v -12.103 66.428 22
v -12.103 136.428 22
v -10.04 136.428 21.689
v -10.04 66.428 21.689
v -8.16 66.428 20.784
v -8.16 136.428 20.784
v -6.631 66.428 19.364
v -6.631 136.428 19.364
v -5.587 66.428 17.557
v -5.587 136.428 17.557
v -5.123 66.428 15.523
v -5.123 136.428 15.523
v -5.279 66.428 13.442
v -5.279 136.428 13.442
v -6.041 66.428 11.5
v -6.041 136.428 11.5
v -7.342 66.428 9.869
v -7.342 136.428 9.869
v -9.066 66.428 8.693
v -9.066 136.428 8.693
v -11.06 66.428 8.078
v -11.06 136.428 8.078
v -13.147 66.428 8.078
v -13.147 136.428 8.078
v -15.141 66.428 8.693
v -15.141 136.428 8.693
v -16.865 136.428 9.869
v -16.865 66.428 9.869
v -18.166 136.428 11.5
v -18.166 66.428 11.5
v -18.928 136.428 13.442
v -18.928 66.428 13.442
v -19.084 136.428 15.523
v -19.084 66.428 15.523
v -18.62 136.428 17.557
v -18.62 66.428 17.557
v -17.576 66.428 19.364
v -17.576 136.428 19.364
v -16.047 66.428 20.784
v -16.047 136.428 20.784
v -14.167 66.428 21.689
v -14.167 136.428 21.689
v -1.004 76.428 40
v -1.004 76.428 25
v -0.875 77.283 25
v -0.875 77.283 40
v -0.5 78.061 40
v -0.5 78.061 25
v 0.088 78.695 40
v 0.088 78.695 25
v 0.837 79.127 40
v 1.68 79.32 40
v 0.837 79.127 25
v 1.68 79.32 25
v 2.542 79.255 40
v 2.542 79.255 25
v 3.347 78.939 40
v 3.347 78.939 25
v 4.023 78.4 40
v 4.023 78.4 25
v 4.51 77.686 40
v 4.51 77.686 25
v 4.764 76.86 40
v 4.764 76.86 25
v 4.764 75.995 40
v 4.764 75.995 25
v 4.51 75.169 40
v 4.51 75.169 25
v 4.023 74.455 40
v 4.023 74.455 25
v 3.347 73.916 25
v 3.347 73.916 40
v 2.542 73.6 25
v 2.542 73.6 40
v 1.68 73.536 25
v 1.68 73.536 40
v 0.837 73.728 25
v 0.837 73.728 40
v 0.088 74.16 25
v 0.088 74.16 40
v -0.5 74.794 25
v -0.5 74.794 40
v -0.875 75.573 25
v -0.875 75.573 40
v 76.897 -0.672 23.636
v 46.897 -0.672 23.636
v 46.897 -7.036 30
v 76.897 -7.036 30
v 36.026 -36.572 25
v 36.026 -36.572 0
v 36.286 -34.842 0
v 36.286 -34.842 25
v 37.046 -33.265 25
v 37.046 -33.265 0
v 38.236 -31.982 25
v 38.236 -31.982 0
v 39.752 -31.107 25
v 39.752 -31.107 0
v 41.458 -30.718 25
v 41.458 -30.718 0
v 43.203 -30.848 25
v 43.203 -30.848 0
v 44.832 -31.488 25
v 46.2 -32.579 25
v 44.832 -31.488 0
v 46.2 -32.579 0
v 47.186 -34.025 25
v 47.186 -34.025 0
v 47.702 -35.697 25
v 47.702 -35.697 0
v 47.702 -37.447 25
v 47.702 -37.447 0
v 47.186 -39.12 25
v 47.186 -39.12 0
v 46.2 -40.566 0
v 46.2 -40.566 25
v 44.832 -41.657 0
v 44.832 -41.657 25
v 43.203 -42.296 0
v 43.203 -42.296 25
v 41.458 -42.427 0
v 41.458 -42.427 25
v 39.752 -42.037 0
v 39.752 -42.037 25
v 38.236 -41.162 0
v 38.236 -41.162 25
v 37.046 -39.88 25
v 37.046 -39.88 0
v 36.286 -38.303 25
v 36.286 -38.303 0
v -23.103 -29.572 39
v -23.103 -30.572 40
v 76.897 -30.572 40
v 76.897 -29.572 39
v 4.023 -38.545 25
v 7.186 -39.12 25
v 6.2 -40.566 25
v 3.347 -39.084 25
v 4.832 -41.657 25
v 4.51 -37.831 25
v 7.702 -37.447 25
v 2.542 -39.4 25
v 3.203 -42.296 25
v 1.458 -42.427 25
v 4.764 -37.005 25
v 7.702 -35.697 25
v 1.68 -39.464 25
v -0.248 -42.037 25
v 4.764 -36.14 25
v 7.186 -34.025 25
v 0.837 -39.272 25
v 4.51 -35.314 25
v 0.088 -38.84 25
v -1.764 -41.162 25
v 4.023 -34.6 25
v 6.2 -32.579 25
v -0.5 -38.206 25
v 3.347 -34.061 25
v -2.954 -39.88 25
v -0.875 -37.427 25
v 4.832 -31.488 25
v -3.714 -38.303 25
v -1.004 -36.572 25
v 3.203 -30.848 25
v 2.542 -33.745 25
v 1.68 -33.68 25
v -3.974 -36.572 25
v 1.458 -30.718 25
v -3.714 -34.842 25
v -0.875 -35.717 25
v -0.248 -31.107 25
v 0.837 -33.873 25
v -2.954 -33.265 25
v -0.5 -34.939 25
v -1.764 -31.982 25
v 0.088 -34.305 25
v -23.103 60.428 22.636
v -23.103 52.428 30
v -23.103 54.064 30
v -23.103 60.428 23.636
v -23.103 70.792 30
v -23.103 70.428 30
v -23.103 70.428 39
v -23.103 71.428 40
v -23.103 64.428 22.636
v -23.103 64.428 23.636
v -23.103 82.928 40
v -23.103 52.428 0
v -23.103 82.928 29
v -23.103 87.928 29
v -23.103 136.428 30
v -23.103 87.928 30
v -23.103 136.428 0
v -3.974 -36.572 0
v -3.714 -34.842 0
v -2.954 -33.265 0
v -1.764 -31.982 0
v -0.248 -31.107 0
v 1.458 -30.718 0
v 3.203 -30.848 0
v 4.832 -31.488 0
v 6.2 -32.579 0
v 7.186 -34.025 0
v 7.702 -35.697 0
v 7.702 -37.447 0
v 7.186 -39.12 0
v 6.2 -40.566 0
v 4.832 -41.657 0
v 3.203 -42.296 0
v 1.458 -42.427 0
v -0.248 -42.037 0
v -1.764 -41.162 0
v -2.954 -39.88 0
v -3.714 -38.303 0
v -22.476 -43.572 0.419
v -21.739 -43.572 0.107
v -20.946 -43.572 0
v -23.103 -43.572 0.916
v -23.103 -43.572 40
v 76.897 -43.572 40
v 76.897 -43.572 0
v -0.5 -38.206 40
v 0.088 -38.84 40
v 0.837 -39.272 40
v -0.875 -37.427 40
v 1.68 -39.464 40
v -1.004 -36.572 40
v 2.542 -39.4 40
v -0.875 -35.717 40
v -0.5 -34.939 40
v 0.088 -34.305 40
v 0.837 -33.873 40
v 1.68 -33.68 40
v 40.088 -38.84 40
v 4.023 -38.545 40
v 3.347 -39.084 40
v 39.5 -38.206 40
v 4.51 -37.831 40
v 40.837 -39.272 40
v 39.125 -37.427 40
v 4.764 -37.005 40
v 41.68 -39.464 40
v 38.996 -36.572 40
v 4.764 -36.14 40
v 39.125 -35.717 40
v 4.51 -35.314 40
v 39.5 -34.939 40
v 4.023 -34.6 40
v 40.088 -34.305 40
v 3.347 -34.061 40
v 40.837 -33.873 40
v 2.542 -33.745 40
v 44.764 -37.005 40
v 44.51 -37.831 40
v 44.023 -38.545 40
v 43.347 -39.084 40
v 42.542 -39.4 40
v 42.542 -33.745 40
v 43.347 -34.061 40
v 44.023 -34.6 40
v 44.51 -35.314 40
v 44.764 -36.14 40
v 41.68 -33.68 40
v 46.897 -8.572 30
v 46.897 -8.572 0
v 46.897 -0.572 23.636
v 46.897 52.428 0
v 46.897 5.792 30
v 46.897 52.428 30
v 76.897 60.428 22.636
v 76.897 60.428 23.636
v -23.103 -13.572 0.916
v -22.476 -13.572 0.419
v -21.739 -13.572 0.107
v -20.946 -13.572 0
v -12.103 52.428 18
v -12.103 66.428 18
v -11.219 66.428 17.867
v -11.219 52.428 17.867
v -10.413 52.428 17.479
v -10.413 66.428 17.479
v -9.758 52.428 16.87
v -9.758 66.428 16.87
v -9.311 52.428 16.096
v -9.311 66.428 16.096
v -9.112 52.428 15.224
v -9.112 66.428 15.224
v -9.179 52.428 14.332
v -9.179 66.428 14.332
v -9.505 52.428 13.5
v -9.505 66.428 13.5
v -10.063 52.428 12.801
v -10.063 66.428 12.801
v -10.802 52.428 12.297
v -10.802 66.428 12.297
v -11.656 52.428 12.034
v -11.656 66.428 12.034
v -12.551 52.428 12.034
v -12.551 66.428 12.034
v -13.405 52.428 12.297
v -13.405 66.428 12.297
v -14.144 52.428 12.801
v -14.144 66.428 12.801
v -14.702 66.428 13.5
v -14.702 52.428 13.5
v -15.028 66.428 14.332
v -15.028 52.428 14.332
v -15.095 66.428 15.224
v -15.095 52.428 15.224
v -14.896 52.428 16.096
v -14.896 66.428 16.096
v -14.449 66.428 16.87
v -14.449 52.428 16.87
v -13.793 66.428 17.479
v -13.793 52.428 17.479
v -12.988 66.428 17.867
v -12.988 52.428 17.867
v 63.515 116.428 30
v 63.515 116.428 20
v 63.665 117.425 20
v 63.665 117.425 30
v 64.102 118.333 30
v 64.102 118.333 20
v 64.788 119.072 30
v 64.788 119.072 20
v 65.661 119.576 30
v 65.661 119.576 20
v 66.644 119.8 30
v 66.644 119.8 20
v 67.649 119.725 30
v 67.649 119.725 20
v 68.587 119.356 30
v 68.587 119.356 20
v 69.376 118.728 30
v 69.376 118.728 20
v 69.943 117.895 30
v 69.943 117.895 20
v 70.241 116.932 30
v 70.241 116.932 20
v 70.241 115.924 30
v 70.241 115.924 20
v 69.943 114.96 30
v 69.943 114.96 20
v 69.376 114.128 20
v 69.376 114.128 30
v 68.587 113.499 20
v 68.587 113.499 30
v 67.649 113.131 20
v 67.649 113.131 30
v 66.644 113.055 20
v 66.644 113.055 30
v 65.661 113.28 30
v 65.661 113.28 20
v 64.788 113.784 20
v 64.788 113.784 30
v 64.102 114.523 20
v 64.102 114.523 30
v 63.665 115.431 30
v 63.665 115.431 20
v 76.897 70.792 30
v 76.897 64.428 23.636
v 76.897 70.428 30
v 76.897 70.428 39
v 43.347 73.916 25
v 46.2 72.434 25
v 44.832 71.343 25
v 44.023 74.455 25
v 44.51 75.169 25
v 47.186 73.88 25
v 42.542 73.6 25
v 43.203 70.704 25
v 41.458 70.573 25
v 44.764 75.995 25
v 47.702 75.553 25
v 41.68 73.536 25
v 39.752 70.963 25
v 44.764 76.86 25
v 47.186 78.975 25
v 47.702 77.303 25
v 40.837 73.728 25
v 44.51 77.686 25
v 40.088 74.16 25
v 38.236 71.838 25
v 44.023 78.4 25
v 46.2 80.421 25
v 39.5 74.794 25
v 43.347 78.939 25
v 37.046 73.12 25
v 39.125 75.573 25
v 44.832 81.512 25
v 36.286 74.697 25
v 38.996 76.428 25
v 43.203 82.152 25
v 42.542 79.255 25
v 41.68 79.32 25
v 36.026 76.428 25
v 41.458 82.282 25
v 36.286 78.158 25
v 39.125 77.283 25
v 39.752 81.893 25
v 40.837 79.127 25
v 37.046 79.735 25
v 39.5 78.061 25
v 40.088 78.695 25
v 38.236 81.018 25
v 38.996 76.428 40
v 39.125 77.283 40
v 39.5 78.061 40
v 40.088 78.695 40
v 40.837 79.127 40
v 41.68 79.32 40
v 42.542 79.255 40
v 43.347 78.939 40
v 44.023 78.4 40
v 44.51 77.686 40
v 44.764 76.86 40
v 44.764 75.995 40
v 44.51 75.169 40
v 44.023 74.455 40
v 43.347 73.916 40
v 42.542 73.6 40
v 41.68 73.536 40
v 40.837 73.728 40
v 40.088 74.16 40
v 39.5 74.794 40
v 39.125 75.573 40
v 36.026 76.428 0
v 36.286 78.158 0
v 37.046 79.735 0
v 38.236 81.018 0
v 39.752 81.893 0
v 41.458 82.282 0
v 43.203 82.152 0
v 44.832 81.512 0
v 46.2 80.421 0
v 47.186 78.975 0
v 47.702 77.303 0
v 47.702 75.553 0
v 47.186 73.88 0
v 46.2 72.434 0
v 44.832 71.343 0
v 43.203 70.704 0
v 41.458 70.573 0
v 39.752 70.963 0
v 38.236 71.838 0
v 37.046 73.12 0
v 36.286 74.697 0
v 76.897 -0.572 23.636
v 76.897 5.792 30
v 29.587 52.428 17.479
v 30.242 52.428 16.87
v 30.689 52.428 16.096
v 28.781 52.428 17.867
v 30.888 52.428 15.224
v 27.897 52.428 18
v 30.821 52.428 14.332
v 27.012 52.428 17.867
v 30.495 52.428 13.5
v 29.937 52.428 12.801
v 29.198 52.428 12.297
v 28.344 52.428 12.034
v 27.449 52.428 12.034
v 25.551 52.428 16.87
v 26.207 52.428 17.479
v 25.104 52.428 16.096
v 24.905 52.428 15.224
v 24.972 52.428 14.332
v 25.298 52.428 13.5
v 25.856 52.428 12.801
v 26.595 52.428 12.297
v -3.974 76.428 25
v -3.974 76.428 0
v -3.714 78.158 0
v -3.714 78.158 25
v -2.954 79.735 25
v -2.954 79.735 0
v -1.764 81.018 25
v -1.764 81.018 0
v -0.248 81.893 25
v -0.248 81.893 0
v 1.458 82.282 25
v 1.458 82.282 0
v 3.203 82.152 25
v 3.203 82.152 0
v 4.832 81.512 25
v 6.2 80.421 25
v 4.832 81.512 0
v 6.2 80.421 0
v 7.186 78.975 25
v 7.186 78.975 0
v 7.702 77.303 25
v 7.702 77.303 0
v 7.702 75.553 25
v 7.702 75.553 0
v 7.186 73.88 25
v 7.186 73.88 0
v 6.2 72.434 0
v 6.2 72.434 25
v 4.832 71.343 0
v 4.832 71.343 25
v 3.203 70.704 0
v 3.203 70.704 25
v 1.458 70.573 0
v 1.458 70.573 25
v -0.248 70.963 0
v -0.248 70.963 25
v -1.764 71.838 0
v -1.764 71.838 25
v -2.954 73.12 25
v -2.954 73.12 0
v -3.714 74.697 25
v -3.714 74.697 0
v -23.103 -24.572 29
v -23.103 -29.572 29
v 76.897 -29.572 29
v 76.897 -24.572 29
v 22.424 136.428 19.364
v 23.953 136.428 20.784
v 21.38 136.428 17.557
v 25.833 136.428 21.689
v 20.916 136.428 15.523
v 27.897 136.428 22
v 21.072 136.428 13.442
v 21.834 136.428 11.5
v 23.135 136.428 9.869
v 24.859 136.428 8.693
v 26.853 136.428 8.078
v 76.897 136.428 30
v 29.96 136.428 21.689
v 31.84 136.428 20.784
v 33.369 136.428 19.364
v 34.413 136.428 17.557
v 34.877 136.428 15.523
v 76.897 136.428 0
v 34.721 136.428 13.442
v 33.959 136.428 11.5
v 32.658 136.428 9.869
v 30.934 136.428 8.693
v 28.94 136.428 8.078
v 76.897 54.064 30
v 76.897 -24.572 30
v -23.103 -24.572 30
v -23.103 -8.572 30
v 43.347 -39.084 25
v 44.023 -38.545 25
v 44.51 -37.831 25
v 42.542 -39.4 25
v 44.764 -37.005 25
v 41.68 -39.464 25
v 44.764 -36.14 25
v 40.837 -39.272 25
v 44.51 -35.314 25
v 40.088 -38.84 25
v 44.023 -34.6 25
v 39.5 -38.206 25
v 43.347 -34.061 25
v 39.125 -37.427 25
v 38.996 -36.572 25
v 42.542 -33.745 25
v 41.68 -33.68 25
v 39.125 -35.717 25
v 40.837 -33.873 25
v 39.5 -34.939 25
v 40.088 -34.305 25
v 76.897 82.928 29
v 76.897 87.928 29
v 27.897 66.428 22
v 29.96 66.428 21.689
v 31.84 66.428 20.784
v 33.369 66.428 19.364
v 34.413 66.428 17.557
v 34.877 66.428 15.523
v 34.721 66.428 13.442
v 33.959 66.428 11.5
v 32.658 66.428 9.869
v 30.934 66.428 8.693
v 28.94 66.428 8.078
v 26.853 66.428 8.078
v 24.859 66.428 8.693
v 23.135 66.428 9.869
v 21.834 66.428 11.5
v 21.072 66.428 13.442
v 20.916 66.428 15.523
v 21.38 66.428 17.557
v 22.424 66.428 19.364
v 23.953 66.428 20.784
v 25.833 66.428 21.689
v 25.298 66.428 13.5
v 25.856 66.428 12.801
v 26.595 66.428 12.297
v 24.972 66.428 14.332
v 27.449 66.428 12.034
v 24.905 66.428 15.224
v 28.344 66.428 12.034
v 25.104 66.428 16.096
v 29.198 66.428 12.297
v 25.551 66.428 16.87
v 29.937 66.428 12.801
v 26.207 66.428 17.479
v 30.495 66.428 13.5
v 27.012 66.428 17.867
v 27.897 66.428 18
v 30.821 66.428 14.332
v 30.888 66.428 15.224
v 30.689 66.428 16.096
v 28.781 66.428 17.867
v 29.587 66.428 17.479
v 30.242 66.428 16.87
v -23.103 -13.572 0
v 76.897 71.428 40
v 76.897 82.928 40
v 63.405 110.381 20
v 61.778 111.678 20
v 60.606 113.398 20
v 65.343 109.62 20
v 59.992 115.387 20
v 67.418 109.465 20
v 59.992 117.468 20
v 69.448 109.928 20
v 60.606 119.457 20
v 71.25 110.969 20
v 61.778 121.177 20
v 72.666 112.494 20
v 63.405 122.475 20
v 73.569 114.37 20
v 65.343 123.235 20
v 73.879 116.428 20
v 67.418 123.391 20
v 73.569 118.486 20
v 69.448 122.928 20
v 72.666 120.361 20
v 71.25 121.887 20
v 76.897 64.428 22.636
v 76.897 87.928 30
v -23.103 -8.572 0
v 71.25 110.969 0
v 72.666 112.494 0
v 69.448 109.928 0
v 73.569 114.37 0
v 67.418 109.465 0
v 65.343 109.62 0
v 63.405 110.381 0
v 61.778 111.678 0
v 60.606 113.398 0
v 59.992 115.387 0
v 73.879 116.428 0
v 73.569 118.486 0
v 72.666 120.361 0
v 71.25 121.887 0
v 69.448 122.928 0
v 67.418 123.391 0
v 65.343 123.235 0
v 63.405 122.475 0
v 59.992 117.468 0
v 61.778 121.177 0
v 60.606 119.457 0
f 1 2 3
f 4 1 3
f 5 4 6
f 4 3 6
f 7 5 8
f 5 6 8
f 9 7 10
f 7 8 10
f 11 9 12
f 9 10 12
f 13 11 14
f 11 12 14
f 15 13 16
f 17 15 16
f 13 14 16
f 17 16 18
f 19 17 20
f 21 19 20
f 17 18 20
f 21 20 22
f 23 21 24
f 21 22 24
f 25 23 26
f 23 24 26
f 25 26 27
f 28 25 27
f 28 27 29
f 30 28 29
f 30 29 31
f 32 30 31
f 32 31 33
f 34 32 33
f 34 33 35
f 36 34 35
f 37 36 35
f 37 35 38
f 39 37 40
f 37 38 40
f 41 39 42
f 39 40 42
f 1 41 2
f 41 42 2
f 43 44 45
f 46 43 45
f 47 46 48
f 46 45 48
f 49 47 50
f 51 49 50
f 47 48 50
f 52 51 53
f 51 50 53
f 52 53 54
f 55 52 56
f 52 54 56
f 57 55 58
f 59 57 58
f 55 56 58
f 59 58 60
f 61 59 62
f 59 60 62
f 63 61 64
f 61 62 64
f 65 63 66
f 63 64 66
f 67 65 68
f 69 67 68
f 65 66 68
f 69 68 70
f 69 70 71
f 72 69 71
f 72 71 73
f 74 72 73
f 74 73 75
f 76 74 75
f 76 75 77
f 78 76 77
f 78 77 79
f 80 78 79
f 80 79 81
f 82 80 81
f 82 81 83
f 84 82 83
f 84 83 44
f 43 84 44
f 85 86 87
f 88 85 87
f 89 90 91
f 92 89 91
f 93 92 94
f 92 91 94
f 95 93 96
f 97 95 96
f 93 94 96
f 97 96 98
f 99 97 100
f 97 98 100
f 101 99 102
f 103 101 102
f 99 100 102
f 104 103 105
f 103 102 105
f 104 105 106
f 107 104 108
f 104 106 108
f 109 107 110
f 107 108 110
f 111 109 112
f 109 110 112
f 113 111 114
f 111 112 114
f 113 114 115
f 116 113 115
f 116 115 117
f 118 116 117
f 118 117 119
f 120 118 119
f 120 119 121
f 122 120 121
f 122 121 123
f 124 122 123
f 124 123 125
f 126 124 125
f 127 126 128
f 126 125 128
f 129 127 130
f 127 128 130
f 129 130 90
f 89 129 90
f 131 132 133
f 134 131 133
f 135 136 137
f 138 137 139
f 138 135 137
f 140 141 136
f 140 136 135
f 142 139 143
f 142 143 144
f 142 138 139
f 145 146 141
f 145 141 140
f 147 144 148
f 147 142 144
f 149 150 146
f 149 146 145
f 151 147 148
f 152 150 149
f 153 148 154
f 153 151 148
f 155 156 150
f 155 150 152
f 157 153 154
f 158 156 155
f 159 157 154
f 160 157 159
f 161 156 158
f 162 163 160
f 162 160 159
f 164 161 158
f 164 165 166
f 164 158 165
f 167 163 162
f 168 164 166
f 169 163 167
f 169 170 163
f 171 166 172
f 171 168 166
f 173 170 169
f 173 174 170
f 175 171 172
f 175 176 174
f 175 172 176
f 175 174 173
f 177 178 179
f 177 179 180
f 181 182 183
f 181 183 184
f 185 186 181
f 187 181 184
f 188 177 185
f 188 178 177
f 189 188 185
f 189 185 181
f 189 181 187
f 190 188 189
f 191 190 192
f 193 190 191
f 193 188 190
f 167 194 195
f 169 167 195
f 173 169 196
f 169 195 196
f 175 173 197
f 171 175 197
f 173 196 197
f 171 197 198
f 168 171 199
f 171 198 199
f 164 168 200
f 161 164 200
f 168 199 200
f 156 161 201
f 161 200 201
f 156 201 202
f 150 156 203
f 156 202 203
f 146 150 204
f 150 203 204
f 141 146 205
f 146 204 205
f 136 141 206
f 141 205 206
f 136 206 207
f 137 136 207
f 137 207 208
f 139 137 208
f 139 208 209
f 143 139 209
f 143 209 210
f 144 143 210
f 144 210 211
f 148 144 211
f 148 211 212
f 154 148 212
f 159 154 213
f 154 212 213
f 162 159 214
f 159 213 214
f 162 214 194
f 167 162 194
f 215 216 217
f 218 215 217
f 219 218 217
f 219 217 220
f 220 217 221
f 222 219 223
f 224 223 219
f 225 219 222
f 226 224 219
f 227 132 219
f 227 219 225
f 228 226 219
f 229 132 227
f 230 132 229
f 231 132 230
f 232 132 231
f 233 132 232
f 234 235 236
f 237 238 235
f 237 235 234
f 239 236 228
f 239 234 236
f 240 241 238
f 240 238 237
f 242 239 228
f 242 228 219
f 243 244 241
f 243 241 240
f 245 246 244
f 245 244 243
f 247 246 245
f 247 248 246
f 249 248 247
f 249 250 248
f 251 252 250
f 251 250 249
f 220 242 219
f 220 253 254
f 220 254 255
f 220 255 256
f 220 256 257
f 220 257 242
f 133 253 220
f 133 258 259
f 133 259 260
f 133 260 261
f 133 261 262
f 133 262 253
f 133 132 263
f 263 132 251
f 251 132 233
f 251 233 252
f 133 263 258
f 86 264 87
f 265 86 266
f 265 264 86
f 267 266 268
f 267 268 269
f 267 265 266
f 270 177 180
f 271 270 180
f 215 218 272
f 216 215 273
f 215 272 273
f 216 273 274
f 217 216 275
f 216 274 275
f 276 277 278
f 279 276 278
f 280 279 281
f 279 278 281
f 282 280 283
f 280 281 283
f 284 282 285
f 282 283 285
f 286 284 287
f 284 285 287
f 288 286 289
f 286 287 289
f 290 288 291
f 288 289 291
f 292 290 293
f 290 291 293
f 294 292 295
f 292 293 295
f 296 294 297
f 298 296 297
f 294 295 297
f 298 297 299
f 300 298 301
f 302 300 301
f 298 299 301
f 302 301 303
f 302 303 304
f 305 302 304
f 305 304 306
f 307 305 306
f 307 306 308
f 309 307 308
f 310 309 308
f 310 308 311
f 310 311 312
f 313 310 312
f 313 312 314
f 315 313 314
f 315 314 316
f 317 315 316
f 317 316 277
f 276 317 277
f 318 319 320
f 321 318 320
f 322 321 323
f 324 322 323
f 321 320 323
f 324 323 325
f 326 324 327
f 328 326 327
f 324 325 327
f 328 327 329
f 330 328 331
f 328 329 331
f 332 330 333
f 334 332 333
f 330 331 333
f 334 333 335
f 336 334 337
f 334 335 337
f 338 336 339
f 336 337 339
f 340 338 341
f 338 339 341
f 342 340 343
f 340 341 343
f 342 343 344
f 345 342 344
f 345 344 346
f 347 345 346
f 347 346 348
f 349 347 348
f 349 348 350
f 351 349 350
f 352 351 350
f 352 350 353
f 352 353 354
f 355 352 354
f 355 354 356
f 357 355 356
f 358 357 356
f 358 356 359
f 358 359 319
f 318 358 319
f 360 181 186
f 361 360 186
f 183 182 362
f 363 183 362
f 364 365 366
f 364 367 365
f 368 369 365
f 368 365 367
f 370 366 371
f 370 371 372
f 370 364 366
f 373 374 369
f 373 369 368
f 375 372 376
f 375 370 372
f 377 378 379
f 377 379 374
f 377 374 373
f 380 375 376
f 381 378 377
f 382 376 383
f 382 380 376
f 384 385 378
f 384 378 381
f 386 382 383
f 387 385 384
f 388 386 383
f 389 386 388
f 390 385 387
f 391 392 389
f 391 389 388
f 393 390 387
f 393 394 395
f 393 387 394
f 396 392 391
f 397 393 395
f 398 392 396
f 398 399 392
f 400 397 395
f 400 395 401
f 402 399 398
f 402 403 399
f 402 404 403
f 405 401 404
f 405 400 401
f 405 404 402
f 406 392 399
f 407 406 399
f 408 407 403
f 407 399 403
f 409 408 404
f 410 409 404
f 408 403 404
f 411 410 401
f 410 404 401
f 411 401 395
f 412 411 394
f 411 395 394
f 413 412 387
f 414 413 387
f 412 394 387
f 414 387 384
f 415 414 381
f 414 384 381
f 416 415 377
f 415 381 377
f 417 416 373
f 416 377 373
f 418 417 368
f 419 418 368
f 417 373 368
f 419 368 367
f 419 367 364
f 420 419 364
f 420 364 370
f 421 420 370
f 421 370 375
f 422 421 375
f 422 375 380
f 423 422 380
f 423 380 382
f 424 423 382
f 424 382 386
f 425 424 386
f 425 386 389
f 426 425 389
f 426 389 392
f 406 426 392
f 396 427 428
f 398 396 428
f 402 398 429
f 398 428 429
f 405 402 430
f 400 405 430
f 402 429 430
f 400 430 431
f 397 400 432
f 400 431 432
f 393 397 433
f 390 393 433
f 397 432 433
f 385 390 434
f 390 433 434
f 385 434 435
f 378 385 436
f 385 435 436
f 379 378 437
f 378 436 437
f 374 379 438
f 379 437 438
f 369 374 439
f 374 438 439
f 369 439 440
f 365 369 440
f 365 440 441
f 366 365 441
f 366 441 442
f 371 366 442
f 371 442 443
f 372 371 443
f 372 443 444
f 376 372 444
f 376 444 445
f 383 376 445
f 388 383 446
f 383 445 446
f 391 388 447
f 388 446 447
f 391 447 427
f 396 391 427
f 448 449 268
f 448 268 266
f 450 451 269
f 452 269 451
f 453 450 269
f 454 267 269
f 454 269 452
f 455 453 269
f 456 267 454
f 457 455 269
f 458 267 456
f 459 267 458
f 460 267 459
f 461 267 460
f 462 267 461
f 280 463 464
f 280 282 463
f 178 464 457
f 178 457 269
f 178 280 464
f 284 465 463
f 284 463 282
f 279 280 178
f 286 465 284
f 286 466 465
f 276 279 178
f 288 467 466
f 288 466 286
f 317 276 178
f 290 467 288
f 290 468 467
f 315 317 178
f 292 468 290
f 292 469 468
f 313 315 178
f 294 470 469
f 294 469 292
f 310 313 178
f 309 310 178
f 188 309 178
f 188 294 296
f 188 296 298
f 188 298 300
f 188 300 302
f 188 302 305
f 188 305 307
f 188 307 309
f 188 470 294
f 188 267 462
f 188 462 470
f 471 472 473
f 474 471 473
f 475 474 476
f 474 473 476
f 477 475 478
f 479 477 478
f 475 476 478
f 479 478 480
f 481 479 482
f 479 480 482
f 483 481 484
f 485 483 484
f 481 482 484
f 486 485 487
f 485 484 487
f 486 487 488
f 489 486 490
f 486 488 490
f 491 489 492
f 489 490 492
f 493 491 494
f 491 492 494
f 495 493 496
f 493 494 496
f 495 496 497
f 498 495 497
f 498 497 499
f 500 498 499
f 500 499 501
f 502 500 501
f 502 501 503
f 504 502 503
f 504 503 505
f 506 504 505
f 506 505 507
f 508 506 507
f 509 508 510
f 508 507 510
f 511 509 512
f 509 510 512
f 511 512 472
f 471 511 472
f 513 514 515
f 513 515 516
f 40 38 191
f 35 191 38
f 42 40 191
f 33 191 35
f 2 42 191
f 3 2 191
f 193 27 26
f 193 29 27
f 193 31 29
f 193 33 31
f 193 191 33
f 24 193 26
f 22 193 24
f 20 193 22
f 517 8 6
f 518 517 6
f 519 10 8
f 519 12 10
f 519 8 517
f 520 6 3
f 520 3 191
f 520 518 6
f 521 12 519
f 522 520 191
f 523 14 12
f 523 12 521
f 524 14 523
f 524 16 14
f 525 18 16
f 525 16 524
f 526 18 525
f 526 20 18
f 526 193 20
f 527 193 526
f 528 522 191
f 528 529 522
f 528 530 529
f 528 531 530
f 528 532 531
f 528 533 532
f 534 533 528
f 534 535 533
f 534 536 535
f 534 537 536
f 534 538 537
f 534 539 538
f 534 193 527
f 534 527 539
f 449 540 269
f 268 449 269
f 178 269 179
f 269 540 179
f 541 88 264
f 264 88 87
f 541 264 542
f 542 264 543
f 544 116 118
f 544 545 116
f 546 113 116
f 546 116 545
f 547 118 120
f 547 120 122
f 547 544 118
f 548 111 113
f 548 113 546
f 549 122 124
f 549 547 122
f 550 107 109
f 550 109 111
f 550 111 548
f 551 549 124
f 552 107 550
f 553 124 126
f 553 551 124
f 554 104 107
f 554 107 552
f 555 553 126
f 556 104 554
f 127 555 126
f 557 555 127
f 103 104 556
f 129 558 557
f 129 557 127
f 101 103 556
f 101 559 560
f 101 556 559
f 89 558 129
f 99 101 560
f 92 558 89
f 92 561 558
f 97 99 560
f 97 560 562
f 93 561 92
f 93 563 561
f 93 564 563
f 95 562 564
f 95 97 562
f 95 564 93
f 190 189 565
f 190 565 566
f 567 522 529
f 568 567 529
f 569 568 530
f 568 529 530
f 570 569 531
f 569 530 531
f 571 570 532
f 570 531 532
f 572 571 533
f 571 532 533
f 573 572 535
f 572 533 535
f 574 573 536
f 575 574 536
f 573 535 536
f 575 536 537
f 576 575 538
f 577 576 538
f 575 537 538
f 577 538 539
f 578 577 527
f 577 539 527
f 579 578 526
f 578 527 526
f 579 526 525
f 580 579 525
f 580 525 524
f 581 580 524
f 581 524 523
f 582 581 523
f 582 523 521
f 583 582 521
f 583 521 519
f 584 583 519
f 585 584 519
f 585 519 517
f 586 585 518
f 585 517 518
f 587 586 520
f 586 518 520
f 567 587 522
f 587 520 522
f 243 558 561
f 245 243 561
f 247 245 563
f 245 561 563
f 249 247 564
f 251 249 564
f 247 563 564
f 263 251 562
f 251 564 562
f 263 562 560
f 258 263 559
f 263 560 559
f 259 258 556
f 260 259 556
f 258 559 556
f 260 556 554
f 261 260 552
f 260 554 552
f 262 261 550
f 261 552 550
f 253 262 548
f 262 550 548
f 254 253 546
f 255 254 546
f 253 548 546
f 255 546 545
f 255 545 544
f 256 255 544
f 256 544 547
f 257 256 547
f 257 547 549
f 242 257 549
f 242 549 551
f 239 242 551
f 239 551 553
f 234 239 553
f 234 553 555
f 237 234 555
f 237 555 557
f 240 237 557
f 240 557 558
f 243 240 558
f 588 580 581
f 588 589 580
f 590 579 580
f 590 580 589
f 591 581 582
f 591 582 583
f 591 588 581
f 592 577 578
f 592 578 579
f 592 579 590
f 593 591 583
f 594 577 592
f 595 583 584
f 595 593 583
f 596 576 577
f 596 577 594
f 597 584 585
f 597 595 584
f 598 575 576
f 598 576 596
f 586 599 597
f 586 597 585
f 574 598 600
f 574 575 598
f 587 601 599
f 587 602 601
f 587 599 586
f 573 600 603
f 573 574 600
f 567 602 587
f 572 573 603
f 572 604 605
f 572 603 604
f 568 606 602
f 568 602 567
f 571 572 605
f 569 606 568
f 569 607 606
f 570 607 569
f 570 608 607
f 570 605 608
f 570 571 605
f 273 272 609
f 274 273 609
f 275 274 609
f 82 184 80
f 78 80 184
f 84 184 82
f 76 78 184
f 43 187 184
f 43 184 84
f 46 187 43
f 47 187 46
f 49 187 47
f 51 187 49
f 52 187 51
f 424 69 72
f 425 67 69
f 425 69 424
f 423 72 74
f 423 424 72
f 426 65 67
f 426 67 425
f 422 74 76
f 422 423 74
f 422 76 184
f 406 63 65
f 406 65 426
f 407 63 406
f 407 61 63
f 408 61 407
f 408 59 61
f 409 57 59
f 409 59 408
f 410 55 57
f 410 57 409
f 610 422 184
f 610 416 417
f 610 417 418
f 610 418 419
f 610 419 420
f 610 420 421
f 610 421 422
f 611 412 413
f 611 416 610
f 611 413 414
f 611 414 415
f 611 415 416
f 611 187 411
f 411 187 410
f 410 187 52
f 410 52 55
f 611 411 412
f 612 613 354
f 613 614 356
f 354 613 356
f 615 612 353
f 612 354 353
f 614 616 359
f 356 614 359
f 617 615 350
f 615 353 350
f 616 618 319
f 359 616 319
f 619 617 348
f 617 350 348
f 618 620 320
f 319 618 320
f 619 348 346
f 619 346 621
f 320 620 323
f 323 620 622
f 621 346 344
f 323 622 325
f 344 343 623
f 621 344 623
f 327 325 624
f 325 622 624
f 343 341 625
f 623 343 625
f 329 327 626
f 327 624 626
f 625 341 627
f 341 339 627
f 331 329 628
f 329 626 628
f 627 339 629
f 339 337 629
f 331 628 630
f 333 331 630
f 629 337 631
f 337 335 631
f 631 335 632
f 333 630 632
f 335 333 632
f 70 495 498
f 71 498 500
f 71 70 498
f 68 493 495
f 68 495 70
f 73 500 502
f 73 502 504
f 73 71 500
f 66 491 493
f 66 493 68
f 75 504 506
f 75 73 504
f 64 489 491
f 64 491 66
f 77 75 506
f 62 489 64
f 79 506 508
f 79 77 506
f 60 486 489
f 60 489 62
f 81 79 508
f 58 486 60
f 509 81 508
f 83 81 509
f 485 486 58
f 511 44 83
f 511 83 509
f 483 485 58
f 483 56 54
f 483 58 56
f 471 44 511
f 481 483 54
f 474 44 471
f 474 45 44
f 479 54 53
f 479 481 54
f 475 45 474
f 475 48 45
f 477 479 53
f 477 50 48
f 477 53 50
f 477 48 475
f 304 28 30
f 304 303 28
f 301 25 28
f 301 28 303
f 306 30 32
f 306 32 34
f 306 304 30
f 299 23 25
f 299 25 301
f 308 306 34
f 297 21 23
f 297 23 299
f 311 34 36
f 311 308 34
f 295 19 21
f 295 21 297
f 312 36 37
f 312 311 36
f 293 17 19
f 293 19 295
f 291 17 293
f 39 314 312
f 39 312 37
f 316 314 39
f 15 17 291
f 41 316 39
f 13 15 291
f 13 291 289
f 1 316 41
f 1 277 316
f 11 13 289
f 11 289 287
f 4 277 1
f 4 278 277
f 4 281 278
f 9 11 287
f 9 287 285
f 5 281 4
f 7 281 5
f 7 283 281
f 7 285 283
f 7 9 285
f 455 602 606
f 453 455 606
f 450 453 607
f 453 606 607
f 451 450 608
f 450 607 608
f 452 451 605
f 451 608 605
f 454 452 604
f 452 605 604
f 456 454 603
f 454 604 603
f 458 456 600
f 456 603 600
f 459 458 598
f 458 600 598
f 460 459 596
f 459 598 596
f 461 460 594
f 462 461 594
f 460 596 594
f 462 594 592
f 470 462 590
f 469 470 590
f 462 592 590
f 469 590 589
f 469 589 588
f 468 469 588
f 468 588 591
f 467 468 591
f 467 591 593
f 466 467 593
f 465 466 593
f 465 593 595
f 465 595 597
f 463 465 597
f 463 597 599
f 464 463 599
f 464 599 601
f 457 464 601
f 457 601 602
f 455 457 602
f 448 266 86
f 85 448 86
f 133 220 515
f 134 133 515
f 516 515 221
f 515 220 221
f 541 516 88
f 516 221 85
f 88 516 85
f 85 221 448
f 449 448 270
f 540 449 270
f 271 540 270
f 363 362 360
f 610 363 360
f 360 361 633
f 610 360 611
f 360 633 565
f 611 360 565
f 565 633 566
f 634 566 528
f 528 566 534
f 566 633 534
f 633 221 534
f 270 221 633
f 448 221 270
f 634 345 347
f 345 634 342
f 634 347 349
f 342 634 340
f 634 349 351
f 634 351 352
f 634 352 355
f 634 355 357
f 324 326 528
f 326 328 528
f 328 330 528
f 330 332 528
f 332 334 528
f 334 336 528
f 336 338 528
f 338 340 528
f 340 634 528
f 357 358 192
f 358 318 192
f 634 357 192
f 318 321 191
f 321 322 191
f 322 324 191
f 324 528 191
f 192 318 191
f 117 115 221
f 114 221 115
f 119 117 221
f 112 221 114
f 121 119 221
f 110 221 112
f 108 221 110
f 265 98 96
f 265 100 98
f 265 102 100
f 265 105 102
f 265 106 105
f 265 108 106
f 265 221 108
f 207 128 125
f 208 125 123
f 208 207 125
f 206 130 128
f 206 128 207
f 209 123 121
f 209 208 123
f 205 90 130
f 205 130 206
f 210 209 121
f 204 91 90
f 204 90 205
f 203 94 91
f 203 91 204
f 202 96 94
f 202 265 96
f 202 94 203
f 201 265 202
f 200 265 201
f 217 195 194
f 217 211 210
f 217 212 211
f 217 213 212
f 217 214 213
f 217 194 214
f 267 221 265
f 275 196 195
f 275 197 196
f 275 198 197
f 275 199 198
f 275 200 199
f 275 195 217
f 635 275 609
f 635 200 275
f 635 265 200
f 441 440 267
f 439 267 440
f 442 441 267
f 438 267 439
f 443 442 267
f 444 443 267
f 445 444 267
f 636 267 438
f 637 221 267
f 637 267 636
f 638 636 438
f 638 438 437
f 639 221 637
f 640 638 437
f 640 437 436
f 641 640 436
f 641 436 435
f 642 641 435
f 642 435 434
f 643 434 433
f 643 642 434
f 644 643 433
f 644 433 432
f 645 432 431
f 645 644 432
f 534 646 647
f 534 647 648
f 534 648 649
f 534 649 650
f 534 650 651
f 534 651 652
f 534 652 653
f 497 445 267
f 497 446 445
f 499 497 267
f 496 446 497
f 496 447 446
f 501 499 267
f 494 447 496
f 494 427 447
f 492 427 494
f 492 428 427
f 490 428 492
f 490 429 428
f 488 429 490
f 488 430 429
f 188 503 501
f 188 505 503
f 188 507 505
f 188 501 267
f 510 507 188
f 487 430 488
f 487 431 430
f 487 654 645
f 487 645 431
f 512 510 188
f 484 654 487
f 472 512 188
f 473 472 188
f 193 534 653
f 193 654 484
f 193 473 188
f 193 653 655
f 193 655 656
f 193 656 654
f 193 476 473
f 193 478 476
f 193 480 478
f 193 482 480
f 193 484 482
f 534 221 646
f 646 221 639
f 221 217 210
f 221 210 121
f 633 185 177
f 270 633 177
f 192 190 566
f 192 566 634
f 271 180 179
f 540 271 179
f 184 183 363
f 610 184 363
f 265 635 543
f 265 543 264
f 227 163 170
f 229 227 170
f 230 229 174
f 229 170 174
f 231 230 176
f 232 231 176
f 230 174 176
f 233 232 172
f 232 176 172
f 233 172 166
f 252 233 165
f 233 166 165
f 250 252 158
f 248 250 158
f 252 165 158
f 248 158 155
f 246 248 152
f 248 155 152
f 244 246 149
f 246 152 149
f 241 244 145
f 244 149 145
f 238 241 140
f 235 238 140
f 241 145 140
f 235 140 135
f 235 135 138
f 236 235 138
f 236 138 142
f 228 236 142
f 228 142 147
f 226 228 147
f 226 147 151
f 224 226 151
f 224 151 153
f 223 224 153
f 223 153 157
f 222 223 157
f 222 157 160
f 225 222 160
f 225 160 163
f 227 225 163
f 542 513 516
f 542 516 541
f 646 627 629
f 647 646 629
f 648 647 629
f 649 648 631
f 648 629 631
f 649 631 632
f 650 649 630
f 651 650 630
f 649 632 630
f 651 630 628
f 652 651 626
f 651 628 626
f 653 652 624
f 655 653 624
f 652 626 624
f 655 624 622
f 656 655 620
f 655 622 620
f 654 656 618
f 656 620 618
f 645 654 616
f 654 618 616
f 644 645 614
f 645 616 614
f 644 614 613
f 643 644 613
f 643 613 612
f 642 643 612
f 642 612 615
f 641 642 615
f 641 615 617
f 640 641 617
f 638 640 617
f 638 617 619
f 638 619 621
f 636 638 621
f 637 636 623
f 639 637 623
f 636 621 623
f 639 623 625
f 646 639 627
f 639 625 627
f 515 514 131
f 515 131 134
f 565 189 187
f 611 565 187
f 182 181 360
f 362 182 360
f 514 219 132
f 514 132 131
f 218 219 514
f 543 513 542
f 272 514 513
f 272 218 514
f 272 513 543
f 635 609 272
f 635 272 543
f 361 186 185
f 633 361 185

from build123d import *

# Parameters (mm, degrees)
BOSS_EXTRUDE1_DEPTH         = 30
SKETCH2_W                   = 1
SKETCH2_H                   = 5
CUT_EXTRUDE1_DEPTH          = 300
SKETCH11_W                  = 100
SKETCH11_H                  = 14
SKETCH11_H_2                = 12.5
BOSS_EXTRUDE2_DEPTH         = 10
SKETCH3_R                   = 3
CUT_EXTRUDE2_DEPTH          = 100
SKETCH4_R                   = 7
CUT_EXTRUDE3_DEPTH          = 70
LPATTERN1_COUNT             = 2
LPATTERN1_PITCH             = 40
SKETCH9_R                   = 3.381759822
CUT_EXTRUDE8_DEPTH          = 100
CUT_EXTRUDE9_START          = -10
SKETCH10_R                  = 6.982534733
CUT_EXTRUDE9_DEPTH          = 20
LPATTERN4_COUNT             = 2
LPATTERN4_PITCH             = 140
SKETCH7_R                   = 2.900161541
CUT_EXTRUDE6_DEPTH          = 40
SKETCH8_R                   = 5.870976625
CUT_EXTRUDE7_DEPTH          = 25
PATTERN_LINEAR_1_COUNT      = 2
PATTERN_LINEAR_1_PITCH      = 40
PATTERN_LINEAR_1_COUNT_DIR2 = 2
PATTERN_LINEAR_1_PITCH_DIR2 = 113
SKETCH_1_W                  = 1
SKETCH_1_H                  = 5
CUT_EXTRUDE_1_DEPTH         = 200
CHAMFER_1_SIZE              = 1
SKETCH_3_R                  = 40
CUT_EXTRUDE_3_DEPTH         = 30
FILLET_1_R                  = 3


with BuildPart() as part:
    # Sketch1 → Boss-Extrude1 (new body)
    with BuildSketch(Plane.XY):
        Polygon((-23.103448276, -43.572275418), (-23.103448276, -8.572275418), (46.896551724, -8.572275418), (46.896551724, 52.427724582), (-23.103448276, 52.427724582), (-23.103448276, 136.427724582), (76.896551724, 136.427724582), (76.896551724, -43.572275418), align=None)
    extrude(amount=BOSS_EXTRUDE1_DEPTH)

    # Sketch2 → Cut-Extrude1 (cut)
    with BuildSketch(Plane.ZY.offset(23.103448276)):
        Polygon((30, 5.791685612), (23.636038969, -0.572275418), (23.636038969, -0.672275418), (30, -7.036236449), align=None)
        Polygon((30, 70.791685612), (23.636038969, 64.427724582), (22.636038969, 64.427724582), (22.636038969, 60.427724582), (23.636038969, 60.427724582), (30, 54.063763551), align=None)
        with Locations((29.5, -27.072275418)):
            Rectangle(SKETCH2_W, SKETCH2_H)
    extrude(amount=-CUT_EXTRUDE1_DEPTH, mode=Mode.SUBTRACT)

    # Sketch11 → Boss-Extrude2 (add)
    with BuildSketch(Plane.XY.offset(30)):
        with Locations((26.896551724, -36.572275418)):
            Rectangle(SKETCH11_W, SKETCH11_H)
        with Locations((26.896551724, 76.677724582)):
            Rectangle(SKETCH11_W, SKETCH11_H_2)
    extrude(amount=BOSS_EXTRUDE2_DEPTH)

    # Sketch3 → Cut-Extrude2 (cut)
    with BuildSketch(Plane(origin=(0, 136.427724582, 0), x_dir=(1, 0, 0), z_dir=(0, 1, 0))):
        with Locations(Location((-12.103448276, -15, 0), (0, 0, 270))):
            Circle(SKETCH3_R)
    cut_extrude2 = extrude(amount=-CUT_EXTRUDE2_DEPTH, mode=Mode.SUBTRACT)

    # Sketch4 → Cut-Extrude3 (cut)
    with BuildSketch(Plane(origin=(0, 136.427724582, 0), x_dir=(1, 0, 0), z_dir=(0, 1, 0))):
        with Locations(Location((-12.103448276, -15, 0), (0, 0, 270))):
            Circle(SKETCH4_R)
    cut_extrude3 = extrude(amount=-CUT_EXTRUDE3_DEPTH, mode=Mode.SUBTRACT)

    # LPattern1: Cut-Extrude2, Cut-Extrude3 ×2
    with Locations(*[(i * LPATTERN1_PITCH, 0, 0) for i in range(1, LPATTERN1_COUNT)]):
        add(cut_extrude2, mode=Mode.SUBTRACT)
        add(cut_extrude3, mode=Mode.SUBTRACT)

    # Sketch9 → Cut-Extrude8 (cut)
    with BuildSketch(Plane(origin=(0, 0, 0), x_dir=(-1, 0, 0), z_dir=(0, 0, -1))):
        with Locations((-66.896551724, 116.427724582)):
            Circle(SKETCH9_R)
    cut_extrude8 = extrude(amount=-CUT_EXTRUDE8_DEPTH, mode=Mode.SUBTRACT)

    # Sketch10 → Cut-Extrude9 (cut)
    with BuildSketch(Plane.XY.offset(30).offset(CUT_EXTRUDE9_START)):
        with Locations((66.896551724, 116.427724582)):
            Circle(SKETCH10_R)
    cut_extrude9 = extrude(amount=-CUT_EXTRUDE9_DEPTH, mode=Mode.SUBTRACT)

    # LPattern4: Cut-Extrude8, Cut-Extrude9 ×2
    with Locations(*[(-i * LPATTERN4_PITCH, 0, 0) for i in range(1, LPATTERN4_COUNT)]):
        add(cut_extrude8, mode=Mode.SUBTRACT)
        add(cut_extrude9, mode=Mode.SUBTRACT)

    # Sketch7 → Cut-Extrude6 (cut)
    with BuildSketch(Plane(origin=(0, 0, 0), x_dir=(-1, 0, 0), z_dir=(0, 0, -1))):
        with Locations((-1.896551724, -36.572275418)):
            Circle(SKETCH7_R)
    cut_extrude6 = extrude(amount=-CUT_EXTRUDE6_DEPTH, mode=Mode.SUBTRACT)

    # Sketch8 → Cut-Extrude7 (cut)
    with BuildSketch(Plane(origin=(0, 0, 0), x_dir=(-1, 0, 0), z_dir=(0, 0, -1))):
        with Locations((-1.896551724, -36.572275418)):
            Circle(SKETCH8_R)
    cut_extrude7 = extrude(amount=-CUT_EXTRUDE7_DEPTH, mode=Mode.SUBTRACT)

    # Линейный массив1: Cut-Extrude6, Cut-Extrude7 2 × 2
    with Locations(*[(i * PATTERN_LINEAR_1_PITCH, j * PATTERN_LINEAR_1_PITCH_DIR2, 0) for i in range(PATTERN_LINEAR_1_COUNT) for j in range(PATTERN_LINEAR_1_COUNT_DIR2) if (i, j) != (0, 0)]):
        add(cut_extrude6, mode=Mode.SUBTRACT)
        add(cut_extrude7, mode=Mode.SUBTRACT)

    # Эскиз1 → Вырез-Вытянуть1 (cut)
    with BuildSketch(Plane.ZY.offset(23.103448276)):
        with Locations((29.5, 85.427724582)):
            Rectangle(SKETCH_1_W, SKETCH_1_H)
    extrude(amount=-CUT_EXTRUDE_1_DEPTH, mode=Mode.SUBTRACT)

    # Фаска1
    chamfer_1_edges = [part.edges().sort_by_distance(p)[0] for p in [
        (26.896551724, 70.427724582, 40),
        (26.896551724, -29.572275418, 40),
    ]]
    chamfer(chamfer_1_edges, length=CHAMFER_1_SIZE)

    # Эскиз3 → Вырез-Вытянуть3 (cut)
    with BuildSketch(Plane.XZ.offset(43.572275418)):
        with Locations((-59.800747668, -15)):
            Circle(SKETCH_3_R)
    extrude(amount=-CUT_EXTRUDE_3_DEPTH, mode=Mode.SUBTRACT)

    # Скругление1
    # the kernel refuses this fillet: 3 mm, written as the material it takes off along each edge
    with BuildSketch(Plane(origin=(-22.719755232, -13.572275418, 0), x_dir=(-0.3864755051047792, 0, 0.9222996714484971), z_dir=(0, -1, 0))) as fillet_1_piece_1:
        with BuildLine():
            CenterArc((2.081301731, -2.795561642), FILLET_1_R, 111.274329899, 45.990298087)
            Line((-0.685597284, -1.636135127), (-0.740935264, -1.612946597))
            Line((-0.740935264, -1.612946597), (-0.05533798, 0.02318853))
            Line((-0.05533798, 0.02318853), (0.0007446, 0.05999538))
            ThreePointArc((0.0007446, 0.05999538), (0.49640021, 0.056919717), (0.971030393, 0.055911233))
            Line((0.971030393, 0.055911233), (0.992800419, 0))
        make_face()
    extrude(amount=34.434933616, mode=Mode.SUBTRACT)


solid = part.part
